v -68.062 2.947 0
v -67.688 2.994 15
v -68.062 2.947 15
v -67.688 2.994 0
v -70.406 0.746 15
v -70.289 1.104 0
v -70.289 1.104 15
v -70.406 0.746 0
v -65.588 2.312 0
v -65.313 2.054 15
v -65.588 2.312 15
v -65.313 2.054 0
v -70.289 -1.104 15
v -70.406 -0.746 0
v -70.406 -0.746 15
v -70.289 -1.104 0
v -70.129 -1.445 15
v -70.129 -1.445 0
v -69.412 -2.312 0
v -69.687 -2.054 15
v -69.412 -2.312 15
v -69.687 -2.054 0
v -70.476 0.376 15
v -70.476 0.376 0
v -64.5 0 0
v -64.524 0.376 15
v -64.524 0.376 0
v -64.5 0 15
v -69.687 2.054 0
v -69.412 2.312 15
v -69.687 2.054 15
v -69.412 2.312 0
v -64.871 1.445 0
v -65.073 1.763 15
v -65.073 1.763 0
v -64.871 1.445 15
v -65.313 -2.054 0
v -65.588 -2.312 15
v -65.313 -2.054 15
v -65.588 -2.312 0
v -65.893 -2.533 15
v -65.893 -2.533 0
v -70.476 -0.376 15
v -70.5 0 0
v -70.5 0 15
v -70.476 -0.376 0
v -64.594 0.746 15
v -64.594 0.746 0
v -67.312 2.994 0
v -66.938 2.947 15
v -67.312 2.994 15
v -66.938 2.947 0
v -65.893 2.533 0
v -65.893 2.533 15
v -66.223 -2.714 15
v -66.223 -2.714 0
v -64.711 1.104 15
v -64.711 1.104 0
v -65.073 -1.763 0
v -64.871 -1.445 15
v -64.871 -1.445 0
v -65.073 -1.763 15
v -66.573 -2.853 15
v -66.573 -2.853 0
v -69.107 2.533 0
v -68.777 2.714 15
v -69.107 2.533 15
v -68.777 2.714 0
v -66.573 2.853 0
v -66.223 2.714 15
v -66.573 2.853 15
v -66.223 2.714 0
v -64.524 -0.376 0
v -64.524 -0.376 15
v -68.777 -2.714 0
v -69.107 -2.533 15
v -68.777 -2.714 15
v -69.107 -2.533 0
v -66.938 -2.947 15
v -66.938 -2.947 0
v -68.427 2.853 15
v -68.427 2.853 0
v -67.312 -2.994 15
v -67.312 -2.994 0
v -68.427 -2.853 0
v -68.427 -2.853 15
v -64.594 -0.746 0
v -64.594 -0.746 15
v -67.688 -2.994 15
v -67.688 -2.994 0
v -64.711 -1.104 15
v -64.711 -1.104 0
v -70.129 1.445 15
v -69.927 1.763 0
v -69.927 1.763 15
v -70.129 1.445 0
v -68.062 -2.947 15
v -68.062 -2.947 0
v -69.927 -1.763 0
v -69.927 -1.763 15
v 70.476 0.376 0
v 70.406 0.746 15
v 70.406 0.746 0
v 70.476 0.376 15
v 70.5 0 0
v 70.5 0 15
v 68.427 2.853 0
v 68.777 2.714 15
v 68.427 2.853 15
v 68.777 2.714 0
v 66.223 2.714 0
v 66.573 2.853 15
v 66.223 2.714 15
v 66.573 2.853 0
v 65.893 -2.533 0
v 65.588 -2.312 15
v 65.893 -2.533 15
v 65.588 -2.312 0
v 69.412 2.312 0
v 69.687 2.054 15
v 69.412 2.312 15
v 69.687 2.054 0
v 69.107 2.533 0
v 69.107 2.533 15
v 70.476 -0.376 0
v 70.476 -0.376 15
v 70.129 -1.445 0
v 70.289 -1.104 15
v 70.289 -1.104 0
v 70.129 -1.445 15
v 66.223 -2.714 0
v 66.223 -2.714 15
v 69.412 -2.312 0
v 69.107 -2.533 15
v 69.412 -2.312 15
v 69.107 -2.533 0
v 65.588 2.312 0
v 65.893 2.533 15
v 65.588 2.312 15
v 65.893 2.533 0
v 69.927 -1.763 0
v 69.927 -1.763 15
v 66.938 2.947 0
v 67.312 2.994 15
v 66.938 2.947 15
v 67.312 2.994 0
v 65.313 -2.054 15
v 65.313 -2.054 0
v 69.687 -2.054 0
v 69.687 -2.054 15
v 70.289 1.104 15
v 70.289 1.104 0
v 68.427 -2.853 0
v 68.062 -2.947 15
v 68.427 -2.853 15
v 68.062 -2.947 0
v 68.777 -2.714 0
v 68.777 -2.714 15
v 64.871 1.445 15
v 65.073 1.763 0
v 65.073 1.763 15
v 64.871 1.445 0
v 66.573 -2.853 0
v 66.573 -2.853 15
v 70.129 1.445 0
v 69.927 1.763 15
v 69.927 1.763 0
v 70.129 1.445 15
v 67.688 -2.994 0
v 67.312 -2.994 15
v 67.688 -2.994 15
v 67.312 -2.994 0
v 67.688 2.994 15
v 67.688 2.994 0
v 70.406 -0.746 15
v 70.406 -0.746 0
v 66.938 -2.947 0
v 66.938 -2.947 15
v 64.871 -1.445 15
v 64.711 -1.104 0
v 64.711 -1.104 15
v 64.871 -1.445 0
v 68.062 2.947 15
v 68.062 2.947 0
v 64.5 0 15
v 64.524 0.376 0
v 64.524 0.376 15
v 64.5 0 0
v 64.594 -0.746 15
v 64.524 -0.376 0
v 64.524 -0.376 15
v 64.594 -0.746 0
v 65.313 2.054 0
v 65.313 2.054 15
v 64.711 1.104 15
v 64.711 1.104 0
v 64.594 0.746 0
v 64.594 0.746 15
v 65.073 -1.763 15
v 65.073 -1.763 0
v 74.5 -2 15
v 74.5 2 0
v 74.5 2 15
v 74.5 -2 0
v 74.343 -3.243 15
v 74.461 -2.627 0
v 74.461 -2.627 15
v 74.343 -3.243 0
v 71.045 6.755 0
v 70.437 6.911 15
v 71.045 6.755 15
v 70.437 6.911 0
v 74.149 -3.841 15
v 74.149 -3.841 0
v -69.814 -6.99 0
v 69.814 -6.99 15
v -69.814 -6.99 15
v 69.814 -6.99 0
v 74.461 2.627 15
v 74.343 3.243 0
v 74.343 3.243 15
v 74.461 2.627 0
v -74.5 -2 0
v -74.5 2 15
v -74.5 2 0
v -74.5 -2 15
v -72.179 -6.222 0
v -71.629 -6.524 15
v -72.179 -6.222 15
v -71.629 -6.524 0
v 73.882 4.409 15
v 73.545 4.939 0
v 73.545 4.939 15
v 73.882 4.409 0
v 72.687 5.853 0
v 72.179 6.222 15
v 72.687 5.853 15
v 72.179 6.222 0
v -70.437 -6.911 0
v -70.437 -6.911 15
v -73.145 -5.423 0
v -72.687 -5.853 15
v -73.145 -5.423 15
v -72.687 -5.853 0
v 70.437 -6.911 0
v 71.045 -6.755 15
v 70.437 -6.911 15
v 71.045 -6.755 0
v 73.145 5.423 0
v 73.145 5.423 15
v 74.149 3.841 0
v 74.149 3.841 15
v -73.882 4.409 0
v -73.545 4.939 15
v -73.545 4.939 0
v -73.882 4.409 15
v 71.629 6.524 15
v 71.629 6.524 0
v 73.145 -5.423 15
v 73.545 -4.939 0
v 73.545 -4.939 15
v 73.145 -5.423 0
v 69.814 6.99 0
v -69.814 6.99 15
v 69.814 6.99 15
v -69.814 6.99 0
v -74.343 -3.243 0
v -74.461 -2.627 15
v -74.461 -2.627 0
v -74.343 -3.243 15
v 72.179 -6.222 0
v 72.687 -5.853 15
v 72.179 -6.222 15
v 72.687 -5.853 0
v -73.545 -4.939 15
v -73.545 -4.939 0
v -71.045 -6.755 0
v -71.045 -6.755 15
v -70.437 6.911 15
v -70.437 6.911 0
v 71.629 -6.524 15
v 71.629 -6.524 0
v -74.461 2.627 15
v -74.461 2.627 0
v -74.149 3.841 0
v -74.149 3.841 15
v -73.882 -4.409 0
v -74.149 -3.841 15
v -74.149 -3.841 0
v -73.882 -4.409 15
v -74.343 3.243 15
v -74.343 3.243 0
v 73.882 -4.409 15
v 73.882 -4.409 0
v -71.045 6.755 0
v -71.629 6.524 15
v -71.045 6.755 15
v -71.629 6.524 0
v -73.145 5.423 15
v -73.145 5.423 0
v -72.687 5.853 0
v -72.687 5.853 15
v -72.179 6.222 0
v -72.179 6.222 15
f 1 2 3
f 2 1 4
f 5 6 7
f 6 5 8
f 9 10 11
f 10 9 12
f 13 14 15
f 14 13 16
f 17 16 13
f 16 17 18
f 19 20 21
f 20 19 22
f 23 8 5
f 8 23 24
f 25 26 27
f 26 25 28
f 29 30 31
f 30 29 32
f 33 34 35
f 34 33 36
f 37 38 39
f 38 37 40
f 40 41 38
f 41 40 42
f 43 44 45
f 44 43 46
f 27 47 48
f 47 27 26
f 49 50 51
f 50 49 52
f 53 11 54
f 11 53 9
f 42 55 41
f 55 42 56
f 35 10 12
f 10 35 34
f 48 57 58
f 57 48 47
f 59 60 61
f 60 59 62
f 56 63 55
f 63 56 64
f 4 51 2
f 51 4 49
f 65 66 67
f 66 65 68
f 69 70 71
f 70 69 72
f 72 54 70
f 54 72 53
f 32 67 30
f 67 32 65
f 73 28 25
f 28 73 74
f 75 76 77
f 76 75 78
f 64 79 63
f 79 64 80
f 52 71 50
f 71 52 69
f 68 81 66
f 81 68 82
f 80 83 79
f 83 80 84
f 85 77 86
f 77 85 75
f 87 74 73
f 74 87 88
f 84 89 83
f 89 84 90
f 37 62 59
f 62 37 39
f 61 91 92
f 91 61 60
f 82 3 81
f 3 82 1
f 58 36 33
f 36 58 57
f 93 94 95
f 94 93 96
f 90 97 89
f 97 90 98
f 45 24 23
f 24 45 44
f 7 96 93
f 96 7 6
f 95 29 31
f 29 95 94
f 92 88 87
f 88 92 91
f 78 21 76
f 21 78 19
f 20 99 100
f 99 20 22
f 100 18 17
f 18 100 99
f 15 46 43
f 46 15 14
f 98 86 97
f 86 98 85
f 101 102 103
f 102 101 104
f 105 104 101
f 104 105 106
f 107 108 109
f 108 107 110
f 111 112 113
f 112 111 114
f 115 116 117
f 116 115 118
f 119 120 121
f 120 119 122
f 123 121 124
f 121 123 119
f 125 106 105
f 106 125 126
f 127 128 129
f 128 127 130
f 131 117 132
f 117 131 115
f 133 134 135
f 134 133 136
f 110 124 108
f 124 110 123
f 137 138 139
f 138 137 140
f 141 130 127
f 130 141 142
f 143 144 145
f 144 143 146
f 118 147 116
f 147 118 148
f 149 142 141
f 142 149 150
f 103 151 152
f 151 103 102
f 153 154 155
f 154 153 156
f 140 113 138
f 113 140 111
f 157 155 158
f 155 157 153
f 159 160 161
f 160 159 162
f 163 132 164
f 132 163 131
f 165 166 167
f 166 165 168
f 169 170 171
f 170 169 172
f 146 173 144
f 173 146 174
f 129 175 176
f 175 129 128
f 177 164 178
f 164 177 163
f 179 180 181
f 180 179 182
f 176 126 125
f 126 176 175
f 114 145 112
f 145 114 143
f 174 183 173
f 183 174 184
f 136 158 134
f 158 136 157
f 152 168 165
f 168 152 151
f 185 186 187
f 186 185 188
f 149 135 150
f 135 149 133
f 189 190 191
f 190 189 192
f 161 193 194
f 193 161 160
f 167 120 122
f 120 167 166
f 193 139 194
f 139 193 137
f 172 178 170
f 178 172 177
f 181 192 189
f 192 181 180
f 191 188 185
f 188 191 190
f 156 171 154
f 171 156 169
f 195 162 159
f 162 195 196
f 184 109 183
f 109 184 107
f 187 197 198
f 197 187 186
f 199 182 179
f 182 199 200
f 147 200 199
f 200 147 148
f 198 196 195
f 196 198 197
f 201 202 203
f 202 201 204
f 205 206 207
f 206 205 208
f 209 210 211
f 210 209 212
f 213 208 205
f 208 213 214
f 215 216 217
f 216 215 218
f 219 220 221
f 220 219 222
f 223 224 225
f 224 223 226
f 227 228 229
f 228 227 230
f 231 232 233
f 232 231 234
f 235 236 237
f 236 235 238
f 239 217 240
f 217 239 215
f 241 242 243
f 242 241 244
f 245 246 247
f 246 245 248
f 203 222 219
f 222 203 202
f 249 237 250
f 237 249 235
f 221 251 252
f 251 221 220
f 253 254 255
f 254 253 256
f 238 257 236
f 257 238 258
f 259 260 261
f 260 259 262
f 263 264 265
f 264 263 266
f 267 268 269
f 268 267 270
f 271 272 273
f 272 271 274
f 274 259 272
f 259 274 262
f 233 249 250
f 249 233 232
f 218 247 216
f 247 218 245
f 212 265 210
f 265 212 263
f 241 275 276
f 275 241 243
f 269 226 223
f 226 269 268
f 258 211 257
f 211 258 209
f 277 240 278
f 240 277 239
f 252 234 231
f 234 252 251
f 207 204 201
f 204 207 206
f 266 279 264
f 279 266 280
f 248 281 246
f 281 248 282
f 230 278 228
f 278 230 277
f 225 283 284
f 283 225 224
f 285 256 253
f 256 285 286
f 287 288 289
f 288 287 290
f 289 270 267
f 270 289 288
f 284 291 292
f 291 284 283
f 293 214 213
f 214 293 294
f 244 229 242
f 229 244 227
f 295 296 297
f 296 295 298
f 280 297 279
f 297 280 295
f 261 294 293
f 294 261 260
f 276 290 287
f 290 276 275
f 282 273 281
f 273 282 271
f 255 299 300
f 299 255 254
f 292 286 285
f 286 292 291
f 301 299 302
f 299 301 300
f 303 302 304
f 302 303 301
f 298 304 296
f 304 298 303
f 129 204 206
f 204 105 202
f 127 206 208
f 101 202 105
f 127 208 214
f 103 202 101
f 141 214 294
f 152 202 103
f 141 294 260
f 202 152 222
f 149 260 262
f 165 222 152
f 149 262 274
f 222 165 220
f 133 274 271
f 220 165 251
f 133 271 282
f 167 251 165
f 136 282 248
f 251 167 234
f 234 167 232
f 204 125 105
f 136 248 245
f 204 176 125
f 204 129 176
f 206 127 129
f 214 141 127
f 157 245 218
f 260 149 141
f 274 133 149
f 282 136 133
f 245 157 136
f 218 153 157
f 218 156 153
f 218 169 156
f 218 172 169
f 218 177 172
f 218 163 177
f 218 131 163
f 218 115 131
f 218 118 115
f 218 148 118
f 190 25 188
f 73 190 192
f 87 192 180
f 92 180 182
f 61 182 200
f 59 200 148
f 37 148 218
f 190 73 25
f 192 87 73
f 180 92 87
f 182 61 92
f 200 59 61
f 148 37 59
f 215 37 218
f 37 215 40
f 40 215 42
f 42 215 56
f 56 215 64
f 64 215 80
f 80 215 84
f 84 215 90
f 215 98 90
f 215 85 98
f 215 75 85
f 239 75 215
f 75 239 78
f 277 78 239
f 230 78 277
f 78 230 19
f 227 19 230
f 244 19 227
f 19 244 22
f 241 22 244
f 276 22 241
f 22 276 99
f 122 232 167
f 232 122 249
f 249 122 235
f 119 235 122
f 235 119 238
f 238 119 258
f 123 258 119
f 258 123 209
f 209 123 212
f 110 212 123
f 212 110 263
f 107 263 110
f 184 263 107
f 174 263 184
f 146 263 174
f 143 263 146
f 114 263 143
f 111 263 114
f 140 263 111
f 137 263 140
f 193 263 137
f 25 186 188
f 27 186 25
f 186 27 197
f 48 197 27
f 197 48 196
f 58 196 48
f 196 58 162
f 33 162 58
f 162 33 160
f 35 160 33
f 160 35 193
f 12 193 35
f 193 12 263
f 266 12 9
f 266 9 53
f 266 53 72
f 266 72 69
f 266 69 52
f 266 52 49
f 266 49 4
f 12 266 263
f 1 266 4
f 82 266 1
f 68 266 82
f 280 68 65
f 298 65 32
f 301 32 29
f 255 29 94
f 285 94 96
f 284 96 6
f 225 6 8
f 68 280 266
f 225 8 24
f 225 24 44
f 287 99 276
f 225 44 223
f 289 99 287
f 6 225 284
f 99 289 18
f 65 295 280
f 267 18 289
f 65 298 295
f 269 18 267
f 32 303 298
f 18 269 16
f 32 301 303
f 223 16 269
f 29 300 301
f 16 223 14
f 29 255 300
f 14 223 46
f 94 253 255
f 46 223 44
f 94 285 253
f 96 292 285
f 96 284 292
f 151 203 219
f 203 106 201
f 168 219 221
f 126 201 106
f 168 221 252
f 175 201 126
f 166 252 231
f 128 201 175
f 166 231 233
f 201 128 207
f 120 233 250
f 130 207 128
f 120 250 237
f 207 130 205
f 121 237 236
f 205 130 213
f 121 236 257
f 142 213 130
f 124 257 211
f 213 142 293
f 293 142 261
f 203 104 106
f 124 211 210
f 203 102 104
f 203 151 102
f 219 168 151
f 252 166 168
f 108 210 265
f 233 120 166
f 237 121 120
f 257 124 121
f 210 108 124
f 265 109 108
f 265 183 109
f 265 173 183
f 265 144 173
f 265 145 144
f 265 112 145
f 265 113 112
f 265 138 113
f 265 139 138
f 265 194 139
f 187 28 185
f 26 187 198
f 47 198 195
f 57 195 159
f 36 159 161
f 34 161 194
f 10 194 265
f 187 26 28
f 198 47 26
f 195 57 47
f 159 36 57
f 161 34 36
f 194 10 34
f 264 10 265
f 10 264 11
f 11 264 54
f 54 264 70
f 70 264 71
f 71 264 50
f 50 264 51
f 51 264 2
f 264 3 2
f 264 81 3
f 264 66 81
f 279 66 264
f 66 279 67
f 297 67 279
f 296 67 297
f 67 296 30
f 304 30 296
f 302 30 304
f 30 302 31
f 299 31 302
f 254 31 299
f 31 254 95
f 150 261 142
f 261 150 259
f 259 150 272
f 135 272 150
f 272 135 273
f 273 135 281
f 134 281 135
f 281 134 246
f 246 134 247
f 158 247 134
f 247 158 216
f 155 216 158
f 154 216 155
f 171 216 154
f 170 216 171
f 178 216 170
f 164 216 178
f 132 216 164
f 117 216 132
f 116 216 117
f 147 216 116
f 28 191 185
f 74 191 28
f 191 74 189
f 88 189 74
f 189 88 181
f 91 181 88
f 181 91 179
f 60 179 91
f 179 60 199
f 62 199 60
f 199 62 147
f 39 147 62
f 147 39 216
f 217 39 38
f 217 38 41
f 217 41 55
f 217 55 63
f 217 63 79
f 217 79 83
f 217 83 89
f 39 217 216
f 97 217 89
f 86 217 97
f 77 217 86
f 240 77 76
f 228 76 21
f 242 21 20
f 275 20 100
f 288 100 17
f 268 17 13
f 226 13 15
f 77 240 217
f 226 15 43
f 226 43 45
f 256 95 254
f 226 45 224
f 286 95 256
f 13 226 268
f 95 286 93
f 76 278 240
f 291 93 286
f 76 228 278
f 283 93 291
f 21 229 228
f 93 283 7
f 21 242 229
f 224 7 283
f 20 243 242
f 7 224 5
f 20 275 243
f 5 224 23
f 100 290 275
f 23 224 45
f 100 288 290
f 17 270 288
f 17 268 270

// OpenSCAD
$fn = 50;


difference() {
	union() {
		hull() {
			translate(v = [-69.5000000000, 2.0000000000, 0]) {
				cylinder(h = 15, r = 5);
			}
			translate(v = [69.5000000000, 2.0000000000, 0]) {
				cylinder(h = 15, r = 5);
			}
			translate(v = [-69.5000000000, -2.0000000000, 0]) {
				cylinder(h = 15, r = 5);
			}
			translate(v = [69.5000000000, -2.0000000000, 0]) {
				cylinder(h = 15, r = 5);
			}
		}
	}
	union() {
		translate(v = [-67.5000000000, 0.0000000000, -100.0000000000]) {
			cylinder(h = 200, r = 3.0000000000);
		}
		translate(v = [-67.5000000000, 0.0000000000, -100.0000000000]) {
			cylinder(h = 200, r = 3.0000000000);
		}
		translate(v = [67.5000000000, 0.0000000000, -100.0000000000]) {
			cylinder(h = 200, r = 3.0000000000);
		}
		translate(v = [67.5000000000, 0.0000000000, -100.0000000000]) {
			cylinder(h = 200, r = 3.0000000000);
		}
	}
}
